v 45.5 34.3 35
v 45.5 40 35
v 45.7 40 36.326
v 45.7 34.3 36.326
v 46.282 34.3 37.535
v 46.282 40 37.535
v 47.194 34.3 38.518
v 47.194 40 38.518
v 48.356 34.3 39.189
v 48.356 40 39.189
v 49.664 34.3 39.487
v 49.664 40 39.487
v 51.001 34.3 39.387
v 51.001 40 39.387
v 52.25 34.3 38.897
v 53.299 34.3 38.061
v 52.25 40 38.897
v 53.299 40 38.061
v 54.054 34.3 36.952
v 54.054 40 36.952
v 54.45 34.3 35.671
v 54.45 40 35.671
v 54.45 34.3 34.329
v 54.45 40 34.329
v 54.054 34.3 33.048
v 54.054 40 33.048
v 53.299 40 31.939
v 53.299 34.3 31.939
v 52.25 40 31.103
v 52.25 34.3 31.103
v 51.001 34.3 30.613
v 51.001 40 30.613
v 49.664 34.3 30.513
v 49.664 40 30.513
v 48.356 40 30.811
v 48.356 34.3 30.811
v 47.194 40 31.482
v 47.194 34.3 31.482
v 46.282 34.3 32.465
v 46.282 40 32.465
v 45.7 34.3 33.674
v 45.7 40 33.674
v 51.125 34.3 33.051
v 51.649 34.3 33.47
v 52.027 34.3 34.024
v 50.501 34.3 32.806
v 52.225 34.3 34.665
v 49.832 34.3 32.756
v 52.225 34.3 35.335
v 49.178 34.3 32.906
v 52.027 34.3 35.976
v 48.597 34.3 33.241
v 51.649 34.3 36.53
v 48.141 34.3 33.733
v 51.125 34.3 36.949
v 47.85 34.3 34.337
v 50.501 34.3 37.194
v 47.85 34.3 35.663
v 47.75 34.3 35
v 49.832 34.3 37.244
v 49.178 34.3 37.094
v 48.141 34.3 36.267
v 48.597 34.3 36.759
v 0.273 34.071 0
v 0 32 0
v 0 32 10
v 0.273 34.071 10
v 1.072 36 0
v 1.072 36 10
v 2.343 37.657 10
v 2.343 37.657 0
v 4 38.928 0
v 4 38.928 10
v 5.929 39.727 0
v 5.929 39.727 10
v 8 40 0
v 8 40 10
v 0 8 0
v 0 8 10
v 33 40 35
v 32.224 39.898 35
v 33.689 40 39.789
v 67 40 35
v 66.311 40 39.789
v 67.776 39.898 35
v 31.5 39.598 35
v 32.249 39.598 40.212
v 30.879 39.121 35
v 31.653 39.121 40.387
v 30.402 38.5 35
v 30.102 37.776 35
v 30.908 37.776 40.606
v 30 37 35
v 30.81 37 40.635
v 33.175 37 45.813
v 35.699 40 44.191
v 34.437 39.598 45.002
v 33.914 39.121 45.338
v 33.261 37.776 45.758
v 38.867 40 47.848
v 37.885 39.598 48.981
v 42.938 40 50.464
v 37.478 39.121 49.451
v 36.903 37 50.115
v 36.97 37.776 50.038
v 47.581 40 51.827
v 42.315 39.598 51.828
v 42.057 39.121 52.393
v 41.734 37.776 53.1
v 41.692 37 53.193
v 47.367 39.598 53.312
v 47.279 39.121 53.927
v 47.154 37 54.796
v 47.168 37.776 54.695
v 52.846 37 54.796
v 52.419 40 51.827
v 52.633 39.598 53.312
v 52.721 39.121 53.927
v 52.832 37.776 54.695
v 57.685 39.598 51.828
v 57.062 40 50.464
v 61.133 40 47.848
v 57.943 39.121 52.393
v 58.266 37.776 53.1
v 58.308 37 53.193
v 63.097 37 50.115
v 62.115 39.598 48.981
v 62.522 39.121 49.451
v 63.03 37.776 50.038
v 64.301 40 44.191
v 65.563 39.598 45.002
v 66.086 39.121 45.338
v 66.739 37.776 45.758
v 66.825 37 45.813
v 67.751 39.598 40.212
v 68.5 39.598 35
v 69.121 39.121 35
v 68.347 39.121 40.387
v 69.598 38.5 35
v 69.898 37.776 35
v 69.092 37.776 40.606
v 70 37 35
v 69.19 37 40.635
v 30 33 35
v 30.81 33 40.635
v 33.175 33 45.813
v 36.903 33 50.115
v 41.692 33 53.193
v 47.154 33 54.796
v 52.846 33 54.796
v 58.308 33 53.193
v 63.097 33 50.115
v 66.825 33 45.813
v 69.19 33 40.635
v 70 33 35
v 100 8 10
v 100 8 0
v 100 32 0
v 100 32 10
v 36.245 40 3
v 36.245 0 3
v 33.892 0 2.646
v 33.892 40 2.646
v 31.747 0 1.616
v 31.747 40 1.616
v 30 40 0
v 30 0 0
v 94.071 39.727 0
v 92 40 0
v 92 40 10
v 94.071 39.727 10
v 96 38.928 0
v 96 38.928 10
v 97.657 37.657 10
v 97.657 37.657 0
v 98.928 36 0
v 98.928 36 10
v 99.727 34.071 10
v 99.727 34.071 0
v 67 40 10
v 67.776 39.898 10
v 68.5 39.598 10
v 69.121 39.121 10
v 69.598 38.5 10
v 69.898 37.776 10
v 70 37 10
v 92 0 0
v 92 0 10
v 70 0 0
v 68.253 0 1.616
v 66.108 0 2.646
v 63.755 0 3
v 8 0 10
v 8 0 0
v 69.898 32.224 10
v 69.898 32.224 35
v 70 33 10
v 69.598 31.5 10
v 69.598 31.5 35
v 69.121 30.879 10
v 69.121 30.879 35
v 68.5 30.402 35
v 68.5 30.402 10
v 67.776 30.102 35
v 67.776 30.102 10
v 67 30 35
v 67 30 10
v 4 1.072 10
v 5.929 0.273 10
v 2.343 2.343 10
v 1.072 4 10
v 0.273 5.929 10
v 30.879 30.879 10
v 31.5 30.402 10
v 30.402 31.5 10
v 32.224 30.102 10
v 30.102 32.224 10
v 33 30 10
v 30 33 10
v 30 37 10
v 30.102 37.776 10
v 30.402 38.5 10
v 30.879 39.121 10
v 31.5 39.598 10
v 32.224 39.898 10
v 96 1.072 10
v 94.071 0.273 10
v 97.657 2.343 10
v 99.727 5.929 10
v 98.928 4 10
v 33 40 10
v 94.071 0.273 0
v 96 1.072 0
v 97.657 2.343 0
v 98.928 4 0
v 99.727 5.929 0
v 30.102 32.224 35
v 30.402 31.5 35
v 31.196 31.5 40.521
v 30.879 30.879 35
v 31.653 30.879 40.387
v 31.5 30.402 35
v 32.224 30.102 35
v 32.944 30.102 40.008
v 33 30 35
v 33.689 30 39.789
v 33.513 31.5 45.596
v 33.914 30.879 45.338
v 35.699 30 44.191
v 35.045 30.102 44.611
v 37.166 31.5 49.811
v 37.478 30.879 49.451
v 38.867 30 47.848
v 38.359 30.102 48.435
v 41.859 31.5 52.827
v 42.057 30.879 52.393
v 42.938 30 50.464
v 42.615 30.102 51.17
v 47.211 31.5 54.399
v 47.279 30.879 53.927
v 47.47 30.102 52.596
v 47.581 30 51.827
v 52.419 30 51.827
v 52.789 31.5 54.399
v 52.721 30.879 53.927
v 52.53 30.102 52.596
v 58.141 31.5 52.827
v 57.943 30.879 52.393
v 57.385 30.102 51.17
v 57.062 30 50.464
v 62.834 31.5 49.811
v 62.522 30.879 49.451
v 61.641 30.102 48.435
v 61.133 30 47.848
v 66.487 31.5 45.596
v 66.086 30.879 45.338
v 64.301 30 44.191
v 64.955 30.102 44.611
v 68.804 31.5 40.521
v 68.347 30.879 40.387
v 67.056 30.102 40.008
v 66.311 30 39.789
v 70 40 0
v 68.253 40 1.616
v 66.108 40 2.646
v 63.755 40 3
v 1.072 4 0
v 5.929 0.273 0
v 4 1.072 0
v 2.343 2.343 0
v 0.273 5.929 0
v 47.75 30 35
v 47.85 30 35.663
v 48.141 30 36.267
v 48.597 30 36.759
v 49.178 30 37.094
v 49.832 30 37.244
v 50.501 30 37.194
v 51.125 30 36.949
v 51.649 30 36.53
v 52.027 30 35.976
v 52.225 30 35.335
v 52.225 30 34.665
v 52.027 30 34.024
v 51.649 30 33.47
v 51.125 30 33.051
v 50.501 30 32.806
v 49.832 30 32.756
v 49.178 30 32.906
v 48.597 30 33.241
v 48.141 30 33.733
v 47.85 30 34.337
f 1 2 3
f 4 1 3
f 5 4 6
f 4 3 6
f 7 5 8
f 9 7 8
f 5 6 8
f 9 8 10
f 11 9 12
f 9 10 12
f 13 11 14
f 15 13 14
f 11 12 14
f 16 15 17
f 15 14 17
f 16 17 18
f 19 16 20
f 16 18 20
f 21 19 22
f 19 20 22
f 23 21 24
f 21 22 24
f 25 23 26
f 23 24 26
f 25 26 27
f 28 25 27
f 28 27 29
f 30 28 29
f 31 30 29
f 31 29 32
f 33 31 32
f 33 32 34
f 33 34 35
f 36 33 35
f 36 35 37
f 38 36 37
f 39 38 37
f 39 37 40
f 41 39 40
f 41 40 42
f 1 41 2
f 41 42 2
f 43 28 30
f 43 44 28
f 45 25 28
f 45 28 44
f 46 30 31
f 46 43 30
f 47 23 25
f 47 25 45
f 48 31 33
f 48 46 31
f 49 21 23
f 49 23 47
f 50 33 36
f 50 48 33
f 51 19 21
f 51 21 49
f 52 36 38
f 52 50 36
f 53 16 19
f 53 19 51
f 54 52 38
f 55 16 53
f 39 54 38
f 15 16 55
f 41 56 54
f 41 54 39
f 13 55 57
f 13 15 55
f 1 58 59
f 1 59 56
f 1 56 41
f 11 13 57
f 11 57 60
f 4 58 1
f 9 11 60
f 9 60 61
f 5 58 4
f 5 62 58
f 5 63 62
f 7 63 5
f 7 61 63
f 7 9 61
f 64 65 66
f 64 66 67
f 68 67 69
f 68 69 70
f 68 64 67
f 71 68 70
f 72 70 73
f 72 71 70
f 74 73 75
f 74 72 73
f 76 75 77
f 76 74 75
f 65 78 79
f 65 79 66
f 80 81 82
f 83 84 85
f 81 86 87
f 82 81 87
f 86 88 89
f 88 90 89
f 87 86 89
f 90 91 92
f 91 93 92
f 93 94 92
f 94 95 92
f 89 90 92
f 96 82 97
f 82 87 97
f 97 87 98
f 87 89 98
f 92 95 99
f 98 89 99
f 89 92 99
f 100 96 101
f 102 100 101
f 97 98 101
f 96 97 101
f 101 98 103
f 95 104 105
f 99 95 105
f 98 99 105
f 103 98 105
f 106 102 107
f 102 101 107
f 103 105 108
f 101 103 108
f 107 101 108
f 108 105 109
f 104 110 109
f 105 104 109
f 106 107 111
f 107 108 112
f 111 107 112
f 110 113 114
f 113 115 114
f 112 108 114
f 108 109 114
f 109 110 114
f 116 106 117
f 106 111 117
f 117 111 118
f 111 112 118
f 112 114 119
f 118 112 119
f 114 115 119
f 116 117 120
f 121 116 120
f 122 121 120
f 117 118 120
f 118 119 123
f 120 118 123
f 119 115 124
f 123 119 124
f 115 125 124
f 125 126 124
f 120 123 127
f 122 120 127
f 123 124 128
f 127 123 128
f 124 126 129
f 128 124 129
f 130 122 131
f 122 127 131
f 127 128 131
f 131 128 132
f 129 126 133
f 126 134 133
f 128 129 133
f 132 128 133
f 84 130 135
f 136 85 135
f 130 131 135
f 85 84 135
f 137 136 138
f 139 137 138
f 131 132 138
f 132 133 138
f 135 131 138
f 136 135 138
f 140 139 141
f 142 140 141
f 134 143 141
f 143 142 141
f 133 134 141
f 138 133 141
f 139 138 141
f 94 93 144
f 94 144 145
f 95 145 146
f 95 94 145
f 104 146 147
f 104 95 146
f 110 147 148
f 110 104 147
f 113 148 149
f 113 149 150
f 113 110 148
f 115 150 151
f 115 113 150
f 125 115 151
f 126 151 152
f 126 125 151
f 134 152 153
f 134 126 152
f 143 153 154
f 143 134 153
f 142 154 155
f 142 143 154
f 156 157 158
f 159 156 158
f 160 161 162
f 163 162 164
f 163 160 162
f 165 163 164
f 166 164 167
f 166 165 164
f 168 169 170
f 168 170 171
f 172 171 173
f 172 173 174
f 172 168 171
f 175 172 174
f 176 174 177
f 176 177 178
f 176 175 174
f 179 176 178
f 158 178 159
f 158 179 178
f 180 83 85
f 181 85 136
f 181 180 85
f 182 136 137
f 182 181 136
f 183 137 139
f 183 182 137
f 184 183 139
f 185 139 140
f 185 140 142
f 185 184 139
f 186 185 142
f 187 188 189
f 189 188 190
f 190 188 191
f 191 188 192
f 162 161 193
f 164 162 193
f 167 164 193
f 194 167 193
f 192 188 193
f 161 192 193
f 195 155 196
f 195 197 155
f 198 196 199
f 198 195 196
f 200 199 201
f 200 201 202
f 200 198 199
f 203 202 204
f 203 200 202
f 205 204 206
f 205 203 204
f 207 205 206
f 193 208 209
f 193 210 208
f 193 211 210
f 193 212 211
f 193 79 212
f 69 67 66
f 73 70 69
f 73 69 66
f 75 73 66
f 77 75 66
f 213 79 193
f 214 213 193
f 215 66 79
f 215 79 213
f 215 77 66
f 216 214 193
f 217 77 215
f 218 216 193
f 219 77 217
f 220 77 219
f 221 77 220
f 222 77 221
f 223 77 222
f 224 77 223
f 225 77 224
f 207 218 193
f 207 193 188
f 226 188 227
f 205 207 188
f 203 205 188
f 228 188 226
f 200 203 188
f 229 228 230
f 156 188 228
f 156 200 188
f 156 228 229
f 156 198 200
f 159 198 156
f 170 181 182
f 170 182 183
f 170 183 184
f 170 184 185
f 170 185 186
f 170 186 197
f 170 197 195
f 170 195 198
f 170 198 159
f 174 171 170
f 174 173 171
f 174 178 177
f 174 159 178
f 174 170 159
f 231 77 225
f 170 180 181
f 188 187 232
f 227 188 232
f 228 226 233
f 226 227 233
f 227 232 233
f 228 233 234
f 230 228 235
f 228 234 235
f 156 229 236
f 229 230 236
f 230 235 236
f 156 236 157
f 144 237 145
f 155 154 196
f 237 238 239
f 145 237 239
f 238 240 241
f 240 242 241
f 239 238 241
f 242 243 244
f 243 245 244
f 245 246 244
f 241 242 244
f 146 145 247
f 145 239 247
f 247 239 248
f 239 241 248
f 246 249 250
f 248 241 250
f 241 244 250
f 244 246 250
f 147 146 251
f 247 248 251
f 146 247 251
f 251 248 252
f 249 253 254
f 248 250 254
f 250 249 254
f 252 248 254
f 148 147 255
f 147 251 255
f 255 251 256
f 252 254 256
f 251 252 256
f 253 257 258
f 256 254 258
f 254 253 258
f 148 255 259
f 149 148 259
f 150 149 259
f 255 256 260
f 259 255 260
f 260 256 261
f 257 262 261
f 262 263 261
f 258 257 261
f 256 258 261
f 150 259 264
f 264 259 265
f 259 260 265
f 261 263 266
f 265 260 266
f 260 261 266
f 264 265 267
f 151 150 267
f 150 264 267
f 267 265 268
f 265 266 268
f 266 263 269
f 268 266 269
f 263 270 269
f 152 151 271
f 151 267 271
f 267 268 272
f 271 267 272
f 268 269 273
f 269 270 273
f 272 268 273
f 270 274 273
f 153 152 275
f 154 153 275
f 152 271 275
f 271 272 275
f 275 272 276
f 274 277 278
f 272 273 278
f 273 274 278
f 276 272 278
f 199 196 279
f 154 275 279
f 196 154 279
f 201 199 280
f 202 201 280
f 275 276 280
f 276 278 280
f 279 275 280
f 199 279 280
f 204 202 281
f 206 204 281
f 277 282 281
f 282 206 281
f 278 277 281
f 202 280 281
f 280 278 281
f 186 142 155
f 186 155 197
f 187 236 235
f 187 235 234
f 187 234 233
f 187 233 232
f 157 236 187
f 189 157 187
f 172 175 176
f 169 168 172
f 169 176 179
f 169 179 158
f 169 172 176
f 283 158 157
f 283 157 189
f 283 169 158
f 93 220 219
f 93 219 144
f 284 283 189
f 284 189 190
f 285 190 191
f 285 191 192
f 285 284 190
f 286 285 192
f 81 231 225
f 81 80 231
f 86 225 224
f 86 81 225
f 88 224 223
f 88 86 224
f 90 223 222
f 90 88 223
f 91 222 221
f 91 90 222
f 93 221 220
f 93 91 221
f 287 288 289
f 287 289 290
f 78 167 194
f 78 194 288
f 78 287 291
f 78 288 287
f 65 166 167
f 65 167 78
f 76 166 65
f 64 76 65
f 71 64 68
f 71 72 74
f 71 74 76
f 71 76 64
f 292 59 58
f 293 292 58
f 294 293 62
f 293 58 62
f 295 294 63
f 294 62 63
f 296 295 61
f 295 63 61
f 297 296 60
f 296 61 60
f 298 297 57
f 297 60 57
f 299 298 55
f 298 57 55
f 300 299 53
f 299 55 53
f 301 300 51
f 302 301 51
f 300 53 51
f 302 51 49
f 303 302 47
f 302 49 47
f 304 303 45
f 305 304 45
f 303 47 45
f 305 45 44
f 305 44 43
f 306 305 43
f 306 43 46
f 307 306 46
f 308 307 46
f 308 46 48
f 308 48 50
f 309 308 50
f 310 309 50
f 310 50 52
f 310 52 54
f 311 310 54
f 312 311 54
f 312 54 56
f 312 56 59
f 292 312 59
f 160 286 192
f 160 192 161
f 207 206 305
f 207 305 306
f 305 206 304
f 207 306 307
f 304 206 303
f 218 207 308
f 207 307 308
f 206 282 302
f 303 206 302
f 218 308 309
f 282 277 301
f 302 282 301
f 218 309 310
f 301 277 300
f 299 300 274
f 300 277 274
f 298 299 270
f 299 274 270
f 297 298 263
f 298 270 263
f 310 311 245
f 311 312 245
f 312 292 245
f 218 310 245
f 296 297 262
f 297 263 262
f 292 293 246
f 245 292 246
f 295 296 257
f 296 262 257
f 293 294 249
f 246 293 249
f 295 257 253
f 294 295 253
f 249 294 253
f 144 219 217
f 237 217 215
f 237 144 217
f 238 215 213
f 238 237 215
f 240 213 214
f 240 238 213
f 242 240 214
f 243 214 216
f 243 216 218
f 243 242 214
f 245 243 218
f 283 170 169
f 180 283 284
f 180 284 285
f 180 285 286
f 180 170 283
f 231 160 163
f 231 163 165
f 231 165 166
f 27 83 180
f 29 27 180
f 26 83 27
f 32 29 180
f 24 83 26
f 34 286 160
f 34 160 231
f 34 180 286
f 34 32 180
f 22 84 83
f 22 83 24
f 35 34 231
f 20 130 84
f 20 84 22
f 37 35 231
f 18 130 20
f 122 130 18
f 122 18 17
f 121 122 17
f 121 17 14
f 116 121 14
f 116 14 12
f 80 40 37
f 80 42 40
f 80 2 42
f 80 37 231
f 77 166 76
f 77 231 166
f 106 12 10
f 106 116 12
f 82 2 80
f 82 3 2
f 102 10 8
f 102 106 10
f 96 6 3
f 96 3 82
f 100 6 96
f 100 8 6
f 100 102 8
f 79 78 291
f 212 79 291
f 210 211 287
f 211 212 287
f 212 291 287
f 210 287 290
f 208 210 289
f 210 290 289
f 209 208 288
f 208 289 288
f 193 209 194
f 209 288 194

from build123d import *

# Parameters (mm, degrees)
F0_W          = 100
F0_H          = 40
F1_DEPTH      = 10
F4_DEPTH      = 10
F5_W          = 40
F5_H          = 3
F6_DEPTH      = 40.001
F7_R          = 2.25
F8_DEPTH      = 40.001
F9_R          = 4.5
F10_DEPTH     = 5.7
F11_T1_DEPTH  = 40
F11_T3_DEPTH  = 40
F11_T5_DEPTH  = 50
F11_T7_DEPTH  = 50
F11_T9_DEPTH  = 50
F11_T11_DEPTH = 50
F12_R         = 3


# Not quite as in the source:
# - a fillet or chamfer that OpenCascade refuses, or shapes differently, is made with other operations: its cross-section is extruded or revolved along the edge and cut away or added


with BuildPart() as f1:
    # F0 (on Top) → F1 (new body)
    with BuildSketch(Plane.XY):
        with Locations((50, 20)):
            Rectangle(F0_W, F0_H)
    extrude(amount=F1_DEPTH)

    # F3 (on face) → F4 (join)
    with BuildSketch(Plane(origin=(0, 40, 0), x_dir=(-1, 0, 0), z_dir=(0, 1, 0))):
        with BuildLine():
            Line((-70, 35), (-70, 0))
            Line((-70, 0), (-30, 0))
            Line((-30, 0), (-30, 35))
            ThreePointArc((-30, 35), (-50, 55), (-70, 35))
        make_face()
    extrude(amount=-F4_DEPTH)

    # F5 (on face) → F6 (cut, through all)
    with BuildSketch(Plane(origin=(0, 40, 0), x_dir=(-1, 0, 0), z_dir=(0, 1, 0))):
        with Locations((-50, 1.5)):
            Rectangle(F5_W, F5_H)
    extrude(amount=-F6_DEPTH, mode=Mode.SUBTRACT)

    # F7 (on face) → F8 (cut, through all)
    with BuildSketch(Plane(origin=(0, 40, 0), x_dir=(-1, 0, 0), z_dir=(0, 1, 0))):
        with Locations((-50, 35)):
            Circle(F7_R)
    extrude(amount=-F8_DEPTH, mode=Mode.SUBTRACT)

    # F9 (on face) → F10 (cut)
    with BuildSketch(Plane(origin=(0, 40, 0), x_dir=(-1, 0, 0), z_dir=(0, 1, 0))):
        with Locations((-50, 35)):
            Circle(F9_R)
    extrude(amount=-F10_DEPTH, mode=Mode.SUBTRACT)

    # F11: fillet of radius 8 on 6 edges, made by hand

    # F11_s2 → F11_t1 (join)
    with BuildSketch(Plane.XZ.offset(-40)):
        with BuildLine():
            ThreePointArc((70, 0), (67.2191036167, 2.2111025509), (63.7550020016, 3))
            Line((63.7550020016, 3), (70, 3))
            Line((70, 3), (70, 0))
        make_face()
    extrude(amount=F11_T1_DEPTH)

    # F11_s4 → F11_t3 (join)
    with BuildSketch(Plane.XZ.offset(-40)):
        with BuildLine():
            ThreePointArc((36.2449979984, 3), (32.7808963833, 2.2111025509), (30, 0))
            Line((30, 0), (30, 3))
            Line((30, 3), (36.2449979984, 3))
        make_face()
    extrude(amount=F11_T3_DEPTH)

    # F11_s6 → F11_t5 (cut)
    with BuildSketch(Plane.XY.offset(-20)):
        with BuildLine():
            ThreePointArc((0, 32), (2.3431457505, 37.6568542495), (8, 40))
            Line((8, 40), (0, 40))
            Line((0, 40), (0, 32))
        make_face()
    extrude(amount=F11_T5_DEPTH, mode=Mode.SUBTRACT)

    # F11_s8 → F11_t7 (cut)
    with BuildSketch(Plane.XY.offset(-20)):
        with BuildLine():
            ThreePointArc((0, 8), (2.3431457505, 2.3431457505), (8, 0))
            Line((8, 0), (0, 0))
            Line((0, 0), (0, 8))
        make_face()
    extrude(amount=F11_T7_DEPTH, mode=Mode.SUBTRACT)

    # F11_s10 → F11_t9 (cut)
    with BuildSketch(Plane.XY.offset(-20)):
        with BuildLine():
            ThreePointArc((92, 40), (97.6568542495, 37.6568542495), (100, 32))
            Line((100, 32), (100, 40))
            Line((100, 40), (92, 40))
        make_face()
    extrude(amount=F11_T9_DEPTH, mode=Mode.SUBTRACT)

    # F11_s12 → F11_t11 (cut)
    with BuildSketch(Plane.XY.offset(-20)):
        with BuildLine():
            ThreePointArc((92, 0), (97.6568542495, 2.3431457505), (100, 8))
            Line((100, 8), (100, 0))
            Line((100, 0), (92, 0))
        make_face()
    extrude(amount=F11_T11_DEPTH, mode=Mode.SUBTRACT)

    # F12
    f12_edges = [f1.edges().sort_by_distance(p)[0] for p in [
        (50, 40, 55),
        (50, 30, 55),
        (30, 40, 22.5),
        (70, 40, 22.5),
        (30, 30, 22.5),
        (70, 30, 22.5),
    ]]
    fillet(f12_edges, radius=F12_R)


solid = f1.part
